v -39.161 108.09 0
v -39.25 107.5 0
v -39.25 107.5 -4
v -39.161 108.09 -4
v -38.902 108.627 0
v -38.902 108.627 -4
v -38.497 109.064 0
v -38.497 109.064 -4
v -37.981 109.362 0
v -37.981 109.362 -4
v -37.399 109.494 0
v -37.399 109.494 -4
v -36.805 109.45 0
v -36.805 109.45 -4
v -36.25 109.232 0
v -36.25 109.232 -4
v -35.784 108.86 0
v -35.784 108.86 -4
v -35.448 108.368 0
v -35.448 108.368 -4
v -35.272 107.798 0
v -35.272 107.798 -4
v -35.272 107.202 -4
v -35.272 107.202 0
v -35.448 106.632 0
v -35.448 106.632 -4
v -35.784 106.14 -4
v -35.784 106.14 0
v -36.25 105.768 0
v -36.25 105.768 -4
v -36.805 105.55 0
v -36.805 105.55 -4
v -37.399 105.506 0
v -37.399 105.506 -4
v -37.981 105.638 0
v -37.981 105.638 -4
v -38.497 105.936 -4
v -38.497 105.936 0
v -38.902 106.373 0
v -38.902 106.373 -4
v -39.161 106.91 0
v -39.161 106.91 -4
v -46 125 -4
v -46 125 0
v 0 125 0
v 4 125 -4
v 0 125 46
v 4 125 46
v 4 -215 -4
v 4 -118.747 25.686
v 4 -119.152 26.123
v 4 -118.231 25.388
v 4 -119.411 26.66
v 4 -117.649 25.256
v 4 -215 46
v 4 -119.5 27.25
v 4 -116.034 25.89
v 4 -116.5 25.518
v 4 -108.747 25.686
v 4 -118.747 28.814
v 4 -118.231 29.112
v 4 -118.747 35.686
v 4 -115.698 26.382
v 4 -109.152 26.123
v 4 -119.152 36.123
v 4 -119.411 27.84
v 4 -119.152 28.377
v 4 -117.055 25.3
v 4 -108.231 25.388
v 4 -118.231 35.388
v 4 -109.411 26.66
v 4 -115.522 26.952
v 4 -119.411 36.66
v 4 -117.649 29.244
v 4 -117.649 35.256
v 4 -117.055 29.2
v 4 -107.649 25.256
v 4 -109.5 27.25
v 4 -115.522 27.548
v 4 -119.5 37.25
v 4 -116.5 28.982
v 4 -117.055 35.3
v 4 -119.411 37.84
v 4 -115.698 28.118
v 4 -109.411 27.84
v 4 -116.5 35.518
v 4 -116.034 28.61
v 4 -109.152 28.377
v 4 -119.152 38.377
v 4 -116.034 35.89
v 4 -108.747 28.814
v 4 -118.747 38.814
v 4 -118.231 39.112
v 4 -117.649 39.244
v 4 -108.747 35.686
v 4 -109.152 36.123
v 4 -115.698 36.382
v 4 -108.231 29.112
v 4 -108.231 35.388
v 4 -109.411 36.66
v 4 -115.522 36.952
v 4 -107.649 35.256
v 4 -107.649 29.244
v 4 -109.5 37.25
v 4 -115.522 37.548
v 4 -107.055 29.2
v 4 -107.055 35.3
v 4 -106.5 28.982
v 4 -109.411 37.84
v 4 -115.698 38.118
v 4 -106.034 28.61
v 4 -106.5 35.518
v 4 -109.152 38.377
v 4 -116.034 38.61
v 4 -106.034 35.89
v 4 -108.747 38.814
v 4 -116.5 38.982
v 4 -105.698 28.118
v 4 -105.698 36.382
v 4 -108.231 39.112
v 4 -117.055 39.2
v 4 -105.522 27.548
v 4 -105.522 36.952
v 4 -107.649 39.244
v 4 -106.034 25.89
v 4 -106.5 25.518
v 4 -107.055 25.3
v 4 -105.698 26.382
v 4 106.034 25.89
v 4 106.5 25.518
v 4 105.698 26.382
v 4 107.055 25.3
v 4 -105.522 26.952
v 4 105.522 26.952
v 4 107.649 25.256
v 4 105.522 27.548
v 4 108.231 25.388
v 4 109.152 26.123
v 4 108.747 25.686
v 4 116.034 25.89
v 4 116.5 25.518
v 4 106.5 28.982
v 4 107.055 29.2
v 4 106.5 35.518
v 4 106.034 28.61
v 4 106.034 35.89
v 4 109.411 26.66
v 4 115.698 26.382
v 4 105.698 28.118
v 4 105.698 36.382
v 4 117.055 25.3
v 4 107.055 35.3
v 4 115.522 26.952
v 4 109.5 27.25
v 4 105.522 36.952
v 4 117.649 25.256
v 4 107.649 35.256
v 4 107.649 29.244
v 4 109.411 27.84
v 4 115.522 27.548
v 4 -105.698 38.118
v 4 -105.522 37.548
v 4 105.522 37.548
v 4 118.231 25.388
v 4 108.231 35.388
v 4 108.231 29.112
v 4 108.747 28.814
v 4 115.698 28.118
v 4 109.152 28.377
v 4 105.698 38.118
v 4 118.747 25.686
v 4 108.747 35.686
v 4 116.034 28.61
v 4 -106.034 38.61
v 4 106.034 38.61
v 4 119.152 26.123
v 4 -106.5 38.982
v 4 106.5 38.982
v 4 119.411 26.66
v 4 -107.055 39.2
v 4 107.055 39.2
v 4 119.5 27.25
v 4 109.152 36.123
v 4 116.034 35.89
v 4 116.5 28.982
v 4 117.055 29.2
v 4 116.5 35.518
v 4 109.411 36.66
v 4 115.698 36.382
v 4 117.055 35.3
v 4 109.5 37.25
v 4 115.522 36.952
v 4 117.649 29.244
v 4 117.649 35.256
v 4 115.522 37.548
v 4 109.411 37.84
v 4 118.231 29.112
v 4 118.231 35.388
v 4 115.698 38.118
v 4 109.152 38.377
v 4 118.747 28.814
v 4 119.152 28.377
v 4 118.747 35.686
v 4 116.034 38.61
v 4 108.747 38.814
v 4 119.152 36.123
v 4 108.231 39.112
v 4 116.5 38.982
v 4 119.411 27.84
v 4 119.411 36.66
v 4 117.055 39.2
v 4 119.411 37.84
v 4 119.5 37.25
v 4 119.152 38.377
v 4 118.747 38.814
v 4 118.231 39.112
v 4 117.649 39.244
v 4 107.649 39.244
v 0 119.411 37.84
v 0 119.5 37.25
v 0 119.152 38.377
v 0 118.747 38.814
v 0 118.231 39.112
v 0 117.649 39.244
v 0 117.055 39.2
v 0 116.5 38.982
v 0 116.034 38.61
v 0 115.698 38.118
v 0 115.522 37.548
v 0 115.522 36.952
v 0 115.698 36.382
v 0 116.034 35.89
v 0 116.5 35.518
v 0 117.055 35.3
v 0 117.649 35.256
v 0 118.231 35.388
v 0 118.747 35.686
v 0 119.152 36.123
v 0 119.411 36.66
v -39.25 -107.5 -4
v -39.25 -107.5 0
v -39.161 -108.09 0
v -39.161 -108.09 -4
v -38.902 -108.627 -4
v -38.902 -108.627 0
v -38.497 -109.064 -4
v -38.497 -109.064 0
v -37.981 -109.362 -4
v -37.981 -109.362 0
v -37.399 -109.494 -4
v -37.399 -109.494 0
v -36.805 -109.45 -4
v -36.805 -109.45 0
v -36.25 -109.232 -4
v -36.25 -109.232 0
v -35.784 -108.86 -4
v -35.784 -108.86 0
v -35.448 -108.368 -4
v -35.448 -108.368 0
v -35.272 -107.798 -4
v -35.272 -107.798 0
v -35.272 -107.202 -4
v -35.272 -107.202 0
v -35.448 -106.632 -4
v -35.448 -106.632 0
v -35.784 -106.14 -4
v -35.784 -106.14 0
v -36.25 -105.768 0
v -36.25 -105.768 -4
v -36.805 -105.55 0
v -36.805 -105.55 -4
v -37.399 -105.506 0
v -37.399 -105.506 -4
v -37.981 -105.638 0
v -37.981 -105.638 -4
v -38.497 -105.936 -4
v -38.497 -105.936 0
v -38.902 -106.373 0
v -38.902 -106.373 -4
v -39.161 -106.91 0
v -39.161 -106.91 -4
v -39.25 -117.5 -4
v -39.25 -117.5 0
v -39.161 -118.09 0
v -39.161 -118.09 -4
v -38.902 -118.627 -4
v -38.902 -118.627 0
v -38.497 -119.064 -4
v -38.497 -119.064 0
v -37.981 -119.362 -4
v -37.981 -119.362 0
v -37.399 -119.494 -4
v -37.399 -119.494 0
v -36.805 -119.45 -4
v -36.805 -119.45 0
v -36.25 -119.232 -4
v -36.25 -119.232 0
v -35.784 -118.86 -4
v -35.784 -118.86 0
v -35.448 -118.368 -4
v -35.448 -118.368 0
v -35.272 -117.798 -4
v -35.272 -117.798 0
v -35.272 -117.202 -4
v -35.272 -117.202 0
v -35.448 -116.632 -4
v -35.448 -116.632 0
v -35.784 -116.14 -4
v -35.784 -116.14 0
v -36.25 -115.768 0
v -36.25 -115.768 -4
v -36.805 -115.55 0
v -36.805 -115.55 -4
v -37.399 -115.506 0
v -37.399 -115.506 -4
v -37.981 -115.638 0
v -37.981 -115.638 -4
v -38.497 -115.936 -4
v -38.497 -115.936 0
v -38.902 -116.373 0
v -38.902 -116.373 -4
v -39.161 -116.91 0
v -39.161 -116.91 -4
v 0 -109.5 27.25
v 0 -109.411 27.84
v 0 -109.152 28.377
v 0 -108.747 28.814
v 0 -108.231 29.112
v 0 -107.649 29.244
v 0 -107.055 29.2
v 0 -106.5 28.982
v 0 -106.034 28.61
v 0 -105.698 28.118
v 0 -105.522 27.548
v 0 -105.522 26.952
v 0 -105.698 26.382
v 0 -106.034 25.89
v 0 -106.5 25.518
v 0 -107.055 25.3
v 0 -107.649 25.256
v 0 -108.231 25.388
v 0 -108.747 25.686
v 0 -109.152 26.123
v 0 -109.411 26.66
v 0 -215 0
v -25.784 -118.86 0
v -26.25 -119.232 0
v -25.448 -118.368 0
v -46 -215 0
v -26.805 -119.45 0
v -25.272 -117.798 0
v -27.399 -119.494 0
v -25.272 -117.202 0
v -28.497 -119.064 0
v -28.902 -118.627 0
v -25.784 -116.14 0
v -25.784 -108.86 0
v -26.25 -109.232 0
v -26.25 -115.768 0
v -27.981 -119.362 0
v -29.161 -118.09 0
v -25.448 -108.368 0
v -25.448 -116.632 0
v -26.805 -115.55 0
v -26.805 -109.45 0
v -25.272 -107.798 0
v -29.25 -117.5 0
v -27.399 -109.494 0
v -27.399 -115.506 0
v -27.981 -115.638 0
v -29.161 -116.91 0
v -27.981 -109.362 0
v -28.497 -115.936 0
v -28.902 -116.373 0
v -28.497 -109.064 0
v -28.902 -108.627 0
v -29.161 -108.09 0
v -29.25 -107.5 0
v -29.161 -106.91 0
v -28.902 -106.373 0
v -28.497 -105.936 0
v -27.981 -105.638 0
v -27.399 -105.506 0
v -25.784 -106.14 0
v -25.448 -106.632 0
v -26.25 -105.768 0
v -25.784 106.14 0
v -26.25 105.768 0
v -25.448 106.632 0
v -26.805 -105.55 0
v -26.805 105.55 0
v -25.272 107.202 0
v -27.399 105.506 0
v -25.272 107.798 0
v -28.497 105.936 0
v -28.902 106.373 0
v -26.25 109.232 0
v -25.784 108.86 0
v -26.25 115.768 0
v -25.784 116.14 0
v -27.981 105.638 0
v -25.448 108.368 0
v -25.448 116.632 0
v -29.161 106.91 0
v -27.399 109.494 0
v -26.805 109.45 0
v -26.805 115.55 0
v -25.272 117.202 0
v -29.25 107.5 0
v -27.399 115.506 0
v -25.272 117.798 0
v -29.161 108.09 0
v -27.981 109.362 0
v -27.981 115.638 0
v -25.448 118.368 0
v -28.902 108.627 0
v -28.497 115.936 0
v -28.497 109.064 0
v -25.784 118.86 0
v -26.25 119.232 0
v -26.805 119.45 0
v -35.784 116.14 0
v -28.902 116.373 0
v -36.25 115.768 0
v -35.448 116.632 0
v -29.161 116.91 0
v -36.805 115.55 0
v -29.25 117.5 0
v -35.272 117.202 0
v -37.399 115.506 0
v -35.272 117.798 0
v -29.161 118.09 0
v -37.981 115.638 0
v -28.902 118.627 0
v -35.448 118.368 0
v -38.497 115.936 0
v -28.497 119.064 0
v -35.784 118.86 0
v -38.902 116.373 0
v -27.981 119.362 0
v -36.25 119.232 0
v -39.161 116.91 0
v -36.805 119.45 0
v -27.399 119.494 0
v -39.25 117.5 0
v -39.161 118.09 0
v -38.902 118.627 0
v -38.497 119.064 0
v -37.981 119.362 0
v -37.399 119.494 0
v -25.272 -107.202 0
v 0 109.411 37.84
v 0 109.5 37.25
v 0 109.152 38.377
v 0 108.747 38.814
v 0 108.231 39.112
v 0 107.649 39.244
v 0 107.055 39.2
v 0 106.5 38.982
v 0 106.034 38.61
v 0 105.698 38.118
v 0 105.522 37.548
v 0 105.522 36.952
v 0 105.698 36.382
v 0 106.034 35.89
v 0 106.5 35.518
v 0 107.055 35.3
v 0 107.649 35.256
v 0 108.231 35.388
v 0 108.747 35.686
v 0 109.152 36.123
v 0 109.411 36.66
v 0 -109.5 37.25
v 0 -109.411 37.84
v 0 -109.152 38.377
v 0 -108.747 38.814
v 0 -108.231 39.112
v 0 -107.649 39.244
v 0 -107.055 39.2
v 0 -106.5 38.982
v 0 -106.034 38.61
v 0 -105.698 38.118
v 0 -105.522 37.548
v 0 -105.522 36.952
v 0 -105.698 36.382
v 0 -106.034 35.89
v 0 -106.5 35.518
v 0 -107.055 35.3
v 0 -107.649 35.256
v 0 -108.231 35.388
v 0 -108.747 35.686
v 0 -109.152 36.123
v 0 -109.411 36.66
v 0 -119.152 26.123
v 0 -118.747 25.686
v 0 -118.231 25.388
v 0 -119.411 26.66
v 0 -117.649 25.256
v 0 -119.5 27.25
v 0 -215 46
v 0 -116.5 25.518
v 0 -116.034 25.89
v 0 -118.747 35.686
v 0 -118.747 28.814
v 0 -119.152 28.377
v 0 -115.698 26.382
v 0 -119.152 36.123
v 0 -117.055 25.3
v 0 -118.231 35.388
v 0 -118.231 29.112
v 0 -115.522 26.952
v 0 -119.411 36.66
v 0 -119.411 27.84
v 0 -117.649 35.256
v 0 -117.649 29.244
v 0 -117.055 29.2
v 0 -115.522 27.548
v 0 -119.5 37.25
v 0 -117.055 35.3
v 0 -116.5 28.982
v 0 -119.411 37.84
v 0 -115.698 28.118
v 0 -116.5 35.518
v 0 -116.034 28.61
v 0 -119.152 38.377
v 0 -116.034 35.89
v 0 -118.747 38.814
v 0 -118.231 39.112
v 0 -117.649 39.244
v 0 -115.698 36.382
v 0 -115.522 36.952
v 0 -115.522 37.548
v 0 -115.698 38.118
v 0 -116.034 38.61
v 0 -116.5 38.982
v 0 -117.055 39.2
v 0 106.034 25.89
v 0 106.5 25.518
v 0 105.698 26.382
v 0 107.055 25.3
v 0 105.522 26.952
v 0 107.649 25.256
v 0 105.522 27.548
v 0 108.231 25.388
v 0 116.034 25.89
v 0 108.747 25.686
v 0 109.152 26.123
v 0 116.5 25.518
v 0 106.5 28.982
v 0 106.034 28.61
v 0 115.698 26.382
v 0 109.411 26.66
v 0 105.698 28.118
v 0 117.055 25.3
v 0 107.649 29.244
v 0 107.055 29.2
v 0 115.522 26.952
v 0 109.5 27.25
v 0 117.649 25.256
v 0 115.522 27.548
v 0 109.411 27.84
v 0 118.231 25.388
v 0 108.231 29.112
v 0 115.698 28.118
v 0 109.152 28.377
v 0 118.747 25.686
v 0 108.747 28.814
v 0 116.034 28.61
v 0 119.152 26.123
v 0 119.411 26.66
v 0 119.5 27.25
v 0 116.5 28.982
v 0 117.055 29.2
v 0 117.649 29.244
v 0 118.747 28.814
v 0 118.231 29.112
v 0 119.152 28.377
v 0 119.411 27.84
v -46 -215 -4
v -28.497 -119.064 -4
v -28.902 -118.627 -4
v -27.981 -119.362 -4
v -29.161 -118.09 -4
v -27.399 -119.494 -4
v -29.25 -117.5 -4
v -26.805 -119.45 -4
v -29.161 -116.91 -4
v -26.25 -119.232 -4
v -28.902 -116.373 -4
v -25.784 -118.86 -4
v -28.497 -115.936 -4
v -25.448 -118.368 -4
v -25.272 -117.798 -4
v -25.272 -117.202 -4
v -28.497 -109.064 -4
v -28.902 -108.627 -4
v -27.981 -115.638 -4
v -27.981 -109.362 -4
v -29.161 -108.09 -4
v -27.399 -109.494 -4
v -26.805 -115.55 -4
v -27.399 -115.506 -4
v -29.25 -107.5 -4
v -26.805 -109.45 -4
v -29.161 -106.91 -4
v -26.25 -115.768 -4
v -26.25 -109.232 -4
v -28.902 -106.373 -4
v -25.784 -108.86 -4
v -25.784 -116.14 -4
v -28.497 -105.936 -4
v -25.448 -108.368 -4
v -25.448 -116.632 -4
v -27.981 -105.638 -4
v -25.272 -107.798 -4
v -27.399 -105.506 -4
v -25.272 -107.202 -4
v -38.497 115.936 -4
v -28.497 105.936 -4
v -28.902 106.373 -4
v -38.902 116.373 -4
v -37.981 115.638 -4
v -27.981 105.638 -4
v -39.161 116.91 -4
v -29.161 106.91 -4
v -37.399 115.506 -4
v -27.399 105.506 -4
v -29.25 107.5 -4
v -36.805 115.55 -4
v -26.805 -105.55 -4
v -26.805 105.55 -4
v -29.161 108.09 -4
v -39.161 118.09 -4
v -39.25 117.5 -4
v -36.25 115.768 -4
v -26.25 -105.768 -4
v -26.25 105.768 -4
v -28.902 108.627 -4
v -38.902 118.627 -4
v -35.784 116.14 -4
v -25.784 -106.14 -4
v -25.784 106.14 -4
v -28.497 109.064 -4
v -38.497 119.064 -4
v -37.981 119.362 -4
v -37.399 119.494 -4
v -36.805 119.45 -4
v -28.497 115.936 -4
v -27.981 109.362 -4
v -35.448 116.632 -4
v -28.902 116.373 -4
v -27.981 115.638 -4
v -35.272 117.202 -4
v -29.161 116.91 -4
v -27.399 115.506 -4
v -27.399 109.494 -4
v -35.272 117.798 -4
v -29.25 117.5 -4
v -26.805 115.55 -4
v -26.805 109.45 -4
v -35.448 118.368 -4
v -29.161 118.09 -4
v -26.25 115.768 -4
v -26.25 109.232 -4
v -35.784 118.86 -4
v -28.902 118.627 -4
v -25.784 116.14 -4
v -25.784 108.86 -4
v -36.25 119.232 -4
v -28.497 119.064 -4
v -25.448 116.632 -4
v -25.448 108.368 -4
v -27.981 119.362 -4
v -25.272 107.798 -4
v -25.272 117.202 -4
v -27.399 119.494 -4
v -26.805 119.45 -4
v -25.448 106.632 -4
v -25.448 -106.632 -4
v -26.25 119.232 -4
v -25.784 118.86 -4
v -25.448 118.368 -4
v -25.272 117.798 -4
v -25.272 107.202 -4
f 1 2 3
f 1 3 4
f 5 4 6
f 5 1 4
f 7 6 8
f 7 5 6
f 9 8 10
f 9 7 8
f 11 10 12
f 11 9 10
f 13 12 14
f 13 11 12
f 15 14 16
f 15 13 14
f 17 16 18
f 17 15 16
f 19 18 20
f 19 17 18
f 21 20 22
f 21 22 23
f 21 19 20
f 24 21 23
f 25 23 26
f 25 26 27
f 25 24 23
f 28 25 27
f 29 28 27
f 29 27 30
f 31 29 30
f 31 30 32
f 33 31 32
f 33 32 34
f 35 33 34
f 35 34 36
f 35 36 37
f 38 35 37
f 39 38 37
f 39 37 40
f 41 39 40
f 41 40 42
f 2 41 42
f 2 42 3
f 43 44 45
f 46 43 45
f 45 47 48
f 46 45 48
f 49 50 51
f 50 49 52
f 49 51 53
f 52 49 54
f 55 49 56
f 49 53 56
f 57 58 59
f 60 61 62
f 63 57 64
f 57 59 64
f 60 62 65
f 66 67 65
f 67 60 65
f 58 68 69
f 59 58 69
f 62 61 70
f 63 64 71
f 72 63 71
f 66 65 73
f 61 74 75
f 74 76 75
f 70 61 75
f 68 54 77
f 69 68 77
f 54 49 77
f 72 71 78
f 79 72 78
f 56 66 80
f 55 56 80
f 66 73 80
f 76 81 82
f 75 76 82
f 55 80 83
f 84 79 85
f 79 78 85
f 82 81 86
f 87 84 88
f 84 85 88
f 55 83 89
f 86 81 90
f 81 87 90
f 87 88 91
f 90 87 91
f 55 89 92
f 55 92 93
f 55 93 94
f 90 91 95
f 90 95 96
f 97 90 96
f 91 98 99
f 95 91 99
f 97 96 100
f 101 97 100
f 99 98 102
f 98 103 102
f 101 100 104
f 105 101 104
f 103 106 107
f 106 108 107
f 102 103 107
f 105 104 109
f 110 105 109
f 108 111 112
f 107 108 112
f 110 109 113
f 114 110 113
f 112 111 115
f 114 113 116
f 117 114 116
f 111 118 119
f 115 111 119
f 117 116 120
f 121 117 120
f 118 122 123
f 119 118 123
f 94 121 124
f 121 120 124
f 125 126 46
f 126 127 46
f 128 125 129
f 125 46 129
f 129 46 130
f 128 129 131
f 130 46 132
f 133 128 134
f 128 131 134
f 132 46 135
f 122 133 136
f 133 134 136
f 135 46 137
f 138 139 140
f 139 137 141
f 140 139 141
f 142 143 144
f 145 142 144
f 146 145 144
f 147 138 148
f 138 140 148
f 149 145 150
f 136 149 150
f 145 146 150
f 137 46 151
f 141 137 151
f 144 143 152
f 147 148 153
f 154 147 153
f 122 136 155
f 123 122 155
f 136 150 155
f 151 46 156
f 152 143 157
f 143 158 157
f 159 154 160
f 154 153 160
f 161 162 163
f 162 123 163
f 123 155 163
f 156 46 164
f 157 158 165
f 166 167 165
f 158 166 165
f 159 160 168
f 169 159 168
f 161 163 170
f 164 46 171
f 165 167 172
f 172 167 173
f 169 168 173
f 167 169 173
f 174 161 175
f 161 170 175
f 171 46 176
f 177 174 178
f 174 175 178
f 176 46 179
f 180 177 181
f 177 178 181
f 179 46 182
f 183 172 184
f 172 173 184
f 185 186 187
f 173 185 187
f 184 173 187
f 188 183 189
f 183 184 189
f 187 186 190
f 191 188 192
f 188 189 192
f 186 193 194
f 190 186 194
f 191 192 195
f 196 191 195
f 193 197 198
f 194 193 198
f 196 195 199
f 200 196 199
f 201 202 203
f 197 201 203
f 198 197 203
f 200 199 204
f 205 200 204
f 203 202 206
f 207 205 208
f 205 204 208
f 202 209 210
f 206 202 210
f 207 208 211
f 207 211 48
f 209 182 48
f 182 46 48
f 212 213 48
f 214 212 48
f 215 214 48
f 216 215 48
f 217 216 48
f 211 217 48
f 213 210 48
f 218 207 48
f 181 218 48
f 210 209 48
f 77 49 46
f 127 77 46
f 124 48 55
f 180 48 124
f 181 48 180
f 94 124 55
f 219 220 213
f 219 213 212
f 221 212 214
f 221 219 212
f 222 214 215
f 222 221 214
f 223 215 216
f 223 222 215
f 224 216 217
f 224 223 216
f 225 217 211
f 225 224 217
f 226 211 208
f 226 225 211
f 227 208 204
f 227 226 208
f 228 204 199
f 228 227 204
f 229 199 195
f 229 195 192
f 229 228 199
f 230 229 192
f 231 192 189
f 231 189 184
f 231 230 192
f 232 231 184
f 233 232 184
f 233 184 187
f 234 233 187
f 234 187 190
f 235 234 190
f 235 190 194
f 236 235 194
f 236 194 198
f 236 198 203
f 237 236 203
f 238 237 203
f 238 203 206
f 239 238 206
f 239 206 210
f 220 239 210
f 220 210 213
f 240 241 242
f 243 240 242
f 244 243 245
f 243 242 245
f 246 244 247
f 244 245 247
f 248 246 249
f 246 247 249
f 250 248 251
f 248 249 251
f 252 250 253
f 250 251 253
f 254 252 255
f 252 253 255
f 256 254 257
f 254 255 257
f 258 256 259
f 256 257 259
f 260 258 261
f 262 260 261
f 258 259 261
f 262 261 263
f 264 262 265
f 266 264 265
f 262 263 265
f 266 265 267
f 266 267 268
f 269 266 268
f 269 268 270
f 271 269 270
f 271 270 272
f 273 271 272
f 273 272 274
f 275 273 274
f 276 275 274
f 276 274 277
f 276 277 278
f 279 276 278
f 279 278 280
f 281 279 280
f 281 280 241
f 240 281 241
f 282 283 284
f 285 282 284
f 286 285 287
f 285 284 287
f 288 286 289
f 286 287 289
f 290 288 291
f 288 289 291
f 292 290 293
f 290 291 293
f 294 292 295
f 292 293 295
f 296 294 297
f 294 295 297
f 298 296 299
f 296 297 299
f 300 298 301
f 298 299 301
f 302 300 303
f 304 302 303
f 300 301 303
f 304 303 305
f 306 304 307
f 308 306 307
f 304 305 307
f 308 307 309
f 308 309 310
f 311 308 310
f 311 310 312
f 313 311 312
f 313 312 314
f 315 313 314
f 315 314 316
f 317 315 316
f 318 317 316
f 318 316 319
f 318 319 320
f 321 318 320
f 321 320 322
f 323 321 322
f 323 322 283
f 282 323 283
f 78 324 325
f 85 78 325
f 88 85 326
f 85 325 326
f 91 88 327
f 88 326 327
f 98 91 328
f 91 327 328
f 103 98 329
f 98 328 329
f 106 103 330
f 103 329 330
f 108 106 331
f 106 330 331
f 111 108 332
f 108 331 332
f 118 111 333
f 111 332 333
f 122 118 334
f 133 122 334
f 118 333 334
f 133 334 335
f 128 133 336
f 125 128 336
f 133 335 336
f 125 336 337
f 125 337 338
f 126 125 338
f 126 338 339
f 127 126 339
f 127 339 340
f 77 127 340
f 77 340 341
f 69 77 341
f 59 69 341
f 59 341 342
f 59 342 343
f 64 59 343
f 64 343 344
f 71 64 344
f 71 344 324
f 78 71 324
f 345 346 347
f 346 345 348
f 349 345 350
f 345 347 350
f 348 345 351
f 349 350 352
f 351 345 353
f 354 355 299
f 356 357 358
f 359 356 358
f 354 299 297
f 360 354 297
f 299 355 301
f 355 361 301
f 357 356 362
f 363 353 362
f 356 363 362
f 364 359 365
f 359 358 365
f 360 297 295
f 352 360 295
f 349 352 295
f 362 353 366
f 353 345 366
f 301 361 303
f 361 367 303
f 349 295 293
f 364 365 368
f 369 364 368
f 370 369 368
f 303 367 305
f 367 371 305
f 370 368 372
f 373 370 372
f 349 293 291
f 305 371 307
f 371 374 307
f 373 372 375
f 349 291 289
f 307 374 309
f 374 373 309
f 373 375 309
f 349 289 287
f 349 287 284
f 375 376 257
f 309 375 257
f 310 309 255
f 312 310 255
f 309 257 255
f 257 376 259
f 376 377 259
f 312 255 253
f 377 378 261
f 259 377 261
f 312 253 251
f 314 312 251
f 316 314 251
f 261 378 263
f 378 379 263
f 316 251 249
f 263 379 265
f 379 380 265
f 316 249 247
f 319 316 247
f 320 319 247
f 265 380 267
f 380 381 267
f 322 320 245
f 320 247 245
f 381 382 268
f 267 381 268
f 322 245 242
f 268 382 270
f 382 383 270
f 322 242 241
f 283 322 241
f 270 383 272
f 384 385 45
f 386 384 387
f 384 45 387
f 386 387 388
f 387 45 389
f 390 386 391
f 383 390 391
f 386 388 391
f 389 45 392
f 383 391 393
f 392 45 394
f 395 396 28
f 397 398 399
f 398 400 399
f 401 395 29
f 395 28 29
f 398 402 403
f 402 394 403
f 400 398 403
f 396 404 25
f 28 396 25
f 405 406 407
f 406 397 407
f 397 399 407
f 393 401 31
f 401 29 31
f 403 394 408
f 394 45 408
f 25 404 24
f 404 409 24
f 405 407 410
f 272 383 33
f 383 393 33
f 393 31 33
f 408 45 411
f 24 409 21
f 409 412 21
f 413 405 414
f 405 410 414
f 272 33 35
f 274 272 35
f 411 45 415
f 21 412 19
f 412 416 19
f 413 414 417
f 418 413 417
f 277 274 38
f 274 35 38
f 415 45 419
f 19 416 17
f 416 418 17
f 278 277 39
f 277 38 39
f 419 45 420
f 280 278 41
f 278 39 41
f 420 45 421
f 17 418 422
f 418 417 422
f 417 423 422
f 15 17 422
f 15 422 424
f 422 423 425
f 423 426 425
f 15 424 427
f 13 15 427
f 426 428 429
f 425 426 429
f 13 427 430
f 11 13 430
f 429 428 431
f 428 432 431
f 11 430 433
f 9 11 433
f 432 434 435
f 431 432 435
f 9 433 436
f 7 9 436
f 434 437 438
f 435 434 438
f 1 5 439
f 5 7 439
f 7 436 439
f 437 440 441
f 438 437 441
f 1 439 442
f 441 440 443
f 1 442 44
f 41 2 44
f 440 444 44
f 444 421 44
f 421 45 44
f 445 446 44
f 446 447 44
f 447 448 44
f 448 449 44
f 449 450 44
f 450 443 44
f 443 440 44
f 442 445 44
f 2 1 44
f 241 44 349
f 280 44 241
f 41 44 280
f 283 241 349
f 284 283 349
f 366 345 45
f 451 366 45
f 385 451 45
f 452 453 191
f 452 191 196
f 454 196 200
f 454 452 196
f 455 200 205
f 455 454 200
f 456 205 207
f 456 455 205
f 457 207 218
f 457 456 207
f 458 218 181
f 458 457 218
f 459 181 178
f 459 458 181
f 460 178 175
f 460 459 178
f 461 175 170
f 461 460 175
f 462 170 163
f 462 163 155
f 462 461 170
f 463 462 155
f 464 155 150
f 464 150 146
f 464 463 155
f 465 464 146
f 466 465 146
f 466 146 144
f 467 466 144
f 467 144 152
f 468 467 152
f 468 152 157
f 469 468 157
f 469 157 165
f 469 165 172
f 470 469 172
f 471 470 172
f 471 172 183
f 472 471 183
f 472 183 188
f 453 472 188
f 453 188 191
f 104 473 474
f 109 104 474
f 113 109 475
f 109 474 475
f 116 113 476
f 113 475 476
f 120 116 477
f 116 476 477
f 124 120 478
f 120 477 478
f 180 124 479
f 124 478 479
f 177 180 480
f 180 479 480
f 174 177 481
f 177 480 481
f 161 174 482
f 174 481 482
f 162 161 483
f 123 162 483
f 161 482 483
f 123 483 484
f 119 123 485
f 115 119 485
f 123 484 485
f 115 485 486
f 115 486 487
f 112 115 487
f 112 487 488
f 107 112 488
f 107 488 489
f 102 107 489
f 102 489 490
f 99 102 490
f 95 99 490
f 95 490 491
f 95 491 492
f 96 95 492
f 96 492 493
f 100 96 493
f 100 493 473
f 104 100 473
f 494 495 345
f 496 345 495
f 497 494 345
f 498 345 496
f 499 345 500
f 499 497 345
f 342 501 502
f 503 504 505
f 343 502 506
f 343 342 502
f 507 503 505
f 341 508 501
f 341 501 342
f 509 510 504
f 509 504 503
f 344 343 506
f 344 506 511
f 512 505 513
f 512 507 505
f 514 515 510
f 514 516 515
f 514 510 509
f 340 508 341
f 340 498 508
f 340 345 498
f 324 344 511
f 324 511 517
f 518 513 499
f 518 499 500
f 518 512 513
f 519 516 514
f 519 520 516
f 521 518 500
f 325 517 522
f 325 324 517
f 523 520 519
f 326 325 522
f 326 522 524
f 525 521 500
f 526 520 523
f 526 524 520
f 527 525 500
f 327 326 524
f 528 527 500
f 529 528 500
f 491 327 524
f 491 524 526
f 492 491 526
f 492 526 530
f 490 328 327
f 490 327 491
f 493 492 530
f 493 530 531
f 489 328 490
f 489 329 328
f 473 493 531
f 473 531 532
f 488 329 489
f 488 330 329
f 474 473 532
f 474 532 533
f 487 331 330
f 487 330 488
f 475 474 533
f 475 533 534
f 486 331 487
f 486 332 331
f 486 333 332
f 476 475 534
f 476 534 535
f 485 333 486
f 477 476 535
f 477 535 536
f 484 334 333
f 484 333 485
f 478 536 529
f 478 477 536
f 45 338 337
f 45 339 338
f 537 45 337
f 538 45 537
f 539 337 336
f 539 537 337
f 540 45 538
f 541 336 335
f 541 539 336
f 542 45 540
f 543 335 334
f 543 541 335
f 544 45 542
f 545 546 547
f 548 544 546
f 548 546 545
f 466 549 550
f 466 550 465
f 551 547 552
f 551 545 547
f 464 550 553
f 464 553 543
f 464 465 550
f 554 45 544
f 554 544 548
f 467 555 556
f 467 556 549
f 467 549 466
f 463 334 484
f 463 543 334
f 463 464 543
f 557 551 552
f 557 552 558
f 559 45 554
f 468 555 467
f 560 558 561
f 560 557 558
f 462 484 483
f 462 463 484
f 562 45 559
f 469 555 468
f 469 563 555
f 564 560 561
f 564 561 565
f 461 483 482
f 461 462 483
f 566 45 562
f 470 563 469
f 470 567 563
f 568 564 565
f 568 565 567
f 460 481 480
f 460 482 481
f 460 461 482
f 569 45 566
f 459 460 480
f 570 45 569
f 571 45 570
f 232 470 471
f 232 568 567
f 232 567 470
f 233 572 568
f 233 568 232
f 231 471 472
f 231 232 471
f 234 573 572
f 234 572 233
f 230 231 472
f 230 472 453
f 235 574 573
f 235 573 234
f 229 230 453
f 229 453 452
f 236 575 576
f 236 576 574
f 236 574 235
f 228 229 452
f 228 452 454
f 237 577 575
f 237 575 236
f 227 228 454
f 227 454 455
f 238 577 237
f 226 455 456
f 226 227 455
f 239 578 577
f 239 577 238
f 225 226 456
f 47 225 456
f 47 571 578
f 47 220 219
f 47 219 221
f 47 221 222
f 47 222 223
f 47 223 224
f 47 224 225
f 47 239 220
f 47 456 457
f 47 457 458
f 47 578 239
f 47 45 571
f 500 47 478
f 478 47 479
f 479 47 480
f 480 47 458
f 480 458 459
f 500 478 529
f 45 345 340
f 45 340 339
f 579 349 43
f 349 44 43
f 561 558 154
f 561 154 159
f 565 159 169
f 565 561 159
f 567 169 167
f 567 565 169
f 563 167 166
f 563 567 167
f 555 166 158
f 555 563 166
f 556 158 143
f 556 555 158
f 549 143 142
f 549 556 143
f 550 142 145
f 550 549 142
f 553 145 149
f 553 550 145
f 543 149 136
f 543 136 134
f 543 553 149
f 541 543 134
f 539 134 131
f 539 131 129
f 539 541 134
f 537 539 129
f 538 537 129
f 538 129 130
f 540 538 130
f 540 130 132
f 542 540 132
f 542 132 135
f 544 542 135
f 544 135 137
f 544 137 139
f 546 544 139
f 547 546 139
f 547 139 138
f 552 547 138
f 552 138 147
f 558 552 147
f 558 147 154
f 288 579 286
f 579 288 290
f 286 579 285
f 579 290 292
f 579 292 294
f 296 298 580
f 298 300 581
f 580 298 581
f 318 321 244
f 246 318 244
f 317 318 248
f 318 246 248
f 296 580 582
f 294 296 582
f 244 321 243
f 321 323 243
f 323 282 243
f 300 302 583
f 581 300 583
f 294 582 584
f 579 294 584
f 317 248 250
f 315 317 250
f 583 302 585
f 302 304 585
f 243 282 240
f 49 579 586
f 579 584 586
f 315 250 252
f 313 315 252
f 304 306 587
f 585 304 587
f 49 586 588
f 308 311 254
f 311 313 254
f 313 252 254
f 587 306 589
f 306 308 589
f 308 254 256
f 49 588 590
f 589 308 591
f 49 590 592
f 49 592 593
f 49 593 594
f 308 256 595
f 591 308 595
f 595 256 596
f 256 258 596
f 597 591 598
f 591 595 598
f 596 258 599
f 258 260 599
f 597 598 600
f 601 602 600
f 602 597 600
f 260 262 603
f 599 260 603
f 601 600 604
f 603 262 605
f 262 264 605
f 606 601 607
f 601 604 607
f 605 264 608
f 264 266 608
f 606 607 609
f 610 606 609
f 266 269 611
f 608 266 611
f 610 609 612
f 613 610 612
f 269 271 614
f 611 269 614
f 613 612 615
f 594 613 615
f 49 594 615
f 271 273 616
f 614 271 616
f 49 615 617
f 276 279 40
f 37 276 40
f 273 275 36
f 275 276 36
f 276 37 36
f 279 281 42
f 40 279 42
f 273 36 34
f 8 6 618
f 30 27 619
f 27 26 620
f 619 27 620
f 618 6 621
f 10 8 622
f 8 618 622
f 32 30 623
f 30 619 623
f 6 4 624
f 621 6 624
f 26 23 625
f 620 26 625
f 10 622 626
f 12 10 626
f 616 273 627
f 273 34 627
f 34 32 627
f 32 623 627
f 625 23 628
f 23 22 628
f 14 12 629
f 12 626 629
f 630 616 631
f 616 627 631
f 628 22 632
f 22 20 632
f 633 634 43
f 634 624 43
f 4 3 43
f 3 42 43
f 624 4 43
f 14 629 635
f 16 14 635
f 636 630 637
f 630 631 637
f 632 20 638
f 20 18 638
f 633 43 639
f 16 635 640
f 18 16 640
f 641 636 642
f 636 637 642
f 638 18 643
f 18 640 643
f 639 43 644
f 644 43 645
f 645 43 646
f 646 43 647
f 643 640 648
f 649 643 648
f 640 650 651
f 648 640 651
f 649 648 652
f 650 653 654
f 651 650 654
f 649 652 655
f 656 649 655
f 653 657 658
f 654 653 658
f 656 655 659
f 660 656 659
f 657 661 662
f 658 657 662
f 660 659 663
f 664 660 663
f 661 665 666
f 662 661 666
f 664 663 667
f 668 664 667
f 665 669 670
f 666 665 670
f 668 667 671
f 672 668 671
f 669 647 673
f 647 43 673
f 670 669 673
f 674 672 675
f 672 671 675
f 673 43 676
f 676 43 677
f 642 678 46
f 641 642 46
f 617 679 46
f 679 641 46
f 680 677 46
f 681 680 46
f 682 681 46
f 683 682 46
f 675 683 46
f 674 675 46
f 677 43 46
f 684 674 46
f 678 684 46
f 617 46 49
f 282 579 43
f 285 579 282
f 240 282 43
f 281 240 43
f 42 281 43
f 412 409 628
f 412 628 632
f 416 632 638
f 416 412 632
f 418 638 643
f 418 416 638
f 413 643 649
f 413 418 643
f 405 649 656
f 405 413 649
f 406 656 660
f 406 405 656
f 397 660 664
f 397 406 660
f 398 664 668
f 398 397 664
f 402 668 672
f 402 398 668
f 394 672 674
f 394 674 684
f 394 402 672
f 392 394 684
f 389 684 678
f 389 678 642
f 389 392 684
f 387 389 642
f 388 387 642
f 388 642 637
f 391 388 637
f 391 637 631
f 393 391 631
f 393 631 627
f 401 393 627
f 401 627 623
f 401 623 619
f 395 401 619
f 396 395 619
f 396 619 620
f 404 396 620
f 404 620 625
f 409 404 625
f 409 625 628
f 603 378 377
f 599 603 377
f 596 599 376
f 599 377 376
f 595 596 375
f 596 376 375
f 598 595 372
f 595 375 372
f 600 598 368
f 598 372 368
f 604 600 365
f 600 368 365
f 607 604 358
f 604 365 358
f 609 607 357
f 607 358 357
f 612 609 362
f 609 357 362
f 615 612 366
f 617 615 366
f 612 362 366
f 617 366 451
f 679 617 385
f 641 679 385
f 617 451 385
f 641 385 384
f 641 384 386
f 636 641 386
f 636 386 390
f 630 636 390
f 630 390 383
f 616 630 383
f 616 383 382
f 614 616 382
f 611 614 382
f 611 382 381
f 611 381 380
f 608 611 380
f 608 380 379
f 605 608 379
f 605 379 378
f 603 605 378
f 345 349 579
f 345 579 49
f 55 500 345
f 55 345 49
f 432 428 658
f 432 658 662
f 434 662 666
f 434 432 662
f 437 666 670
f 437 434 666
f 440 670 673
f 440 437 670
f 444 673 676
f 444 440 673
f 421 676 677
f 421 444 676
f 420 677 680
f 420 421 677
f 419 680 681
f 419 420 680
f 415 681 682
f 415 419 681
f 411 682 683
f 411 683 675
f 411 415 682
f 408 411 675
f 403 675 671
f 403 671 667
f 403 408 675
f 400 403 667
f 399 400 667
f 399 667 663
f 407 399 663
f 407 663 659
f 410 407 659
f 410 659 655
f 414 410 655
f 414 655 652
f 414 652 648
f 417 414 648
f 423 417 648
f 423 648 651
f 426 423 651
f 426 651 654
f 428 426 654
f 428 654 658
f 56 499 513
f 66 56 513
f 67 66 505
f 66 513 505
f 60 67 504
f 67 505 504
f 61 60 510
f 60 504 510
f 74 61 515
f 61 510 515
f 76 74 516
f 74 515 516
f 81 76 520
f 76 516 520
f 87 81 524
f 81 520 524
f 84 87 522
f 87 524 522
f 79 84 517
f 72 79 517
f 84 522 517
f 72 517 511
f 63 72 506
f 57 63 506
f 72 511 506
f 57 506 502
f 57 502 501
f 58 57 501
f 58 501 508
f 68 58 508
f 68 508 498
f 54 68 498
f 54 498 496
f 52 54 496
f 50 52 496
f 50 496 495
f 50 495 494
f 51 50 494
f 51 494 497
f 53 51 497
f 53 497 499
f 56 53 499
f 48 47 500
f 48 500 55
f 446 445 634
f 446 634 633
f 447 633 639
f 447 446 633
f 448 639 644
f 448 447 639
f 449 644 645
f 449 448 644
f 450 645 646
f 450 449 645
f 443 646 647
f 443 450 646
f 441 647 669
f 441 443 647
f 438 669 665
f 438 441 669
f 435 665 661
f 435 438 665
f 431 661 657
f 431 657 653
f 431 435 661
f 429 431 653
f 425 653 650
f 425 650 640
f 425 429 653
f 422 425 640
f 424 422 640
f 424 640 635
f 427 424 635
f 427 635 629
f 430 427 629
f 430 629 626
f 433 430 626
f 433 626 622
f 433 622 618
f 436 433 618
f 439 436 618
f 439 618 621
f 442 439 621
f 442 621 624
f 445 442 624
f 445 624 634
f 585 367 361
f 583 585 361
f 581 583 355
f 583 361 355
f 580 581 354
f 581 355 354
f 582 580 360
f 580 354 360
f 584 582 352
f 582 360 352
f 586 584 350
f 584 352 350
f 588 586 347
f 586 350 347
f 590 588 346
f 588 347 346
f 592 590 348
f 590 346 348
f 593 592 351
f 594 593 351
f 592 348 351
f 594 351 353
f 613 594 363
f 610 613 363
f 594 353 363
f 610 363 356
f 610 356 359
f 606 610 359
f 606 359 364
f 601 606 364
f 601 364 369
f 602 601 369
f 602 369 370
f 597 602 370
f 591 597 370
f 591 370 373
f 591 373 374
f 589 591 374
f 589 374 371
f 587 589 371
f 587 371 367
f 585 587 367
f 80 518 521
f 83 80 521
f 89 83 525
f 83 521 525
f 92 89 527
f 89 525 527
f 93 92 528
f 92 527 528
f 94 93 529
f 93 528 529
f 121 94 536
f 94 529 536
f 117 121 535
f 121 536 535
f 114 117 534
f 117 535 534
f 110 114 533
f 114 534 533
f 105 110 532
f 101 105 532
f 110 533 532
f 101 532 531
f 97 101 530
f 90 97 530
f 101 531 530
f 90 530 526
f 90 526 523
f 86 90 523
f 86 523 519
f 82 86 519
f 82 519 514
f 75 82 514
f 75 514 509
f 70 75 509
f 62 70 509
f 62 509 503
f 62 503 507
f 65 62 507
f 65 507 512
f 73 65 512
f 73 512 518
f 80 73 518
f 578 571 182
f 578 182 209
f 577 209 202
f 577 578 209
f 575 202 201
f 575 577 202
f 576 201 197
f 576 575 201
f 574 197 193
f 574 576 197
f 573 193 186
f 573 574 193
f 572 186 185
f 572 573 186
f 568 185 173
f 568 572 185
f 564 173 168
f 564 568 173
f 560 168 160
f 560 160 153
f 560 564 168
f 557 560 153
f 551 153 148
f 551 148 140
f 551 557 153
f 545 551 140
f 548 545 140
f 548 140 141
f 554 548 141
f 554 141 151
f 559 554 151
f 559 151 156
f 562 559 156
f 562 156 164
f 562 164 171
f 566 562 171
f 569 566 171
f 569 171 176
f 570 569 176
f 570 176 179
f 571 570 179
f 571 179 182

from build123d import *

# Parameters (mm, degrees)
F0_W           = 4
F0_H           = 46
F1_DEPTH       = 125
F4_D           = 4
F4_DEPTH       = 15
F4_TIP         = 1.2017212381
F4_ON_F2_D     = 4
F4_ON_F2_DEPTH = 15
F4_ON_F2_TIP   = 1.2017212381
F6_DEPTH       = 90


with BuildPart() as f1:
    # F0 (on Front) → F1 (new body)
    with BuildSketch(Plane.XZ):
        with Locations((2, 23)):
            Rectangle(F0_W, F0_H)
        Polygon((4, 0), (0, 0), (-46, 0), (-46, -4), (4, -4), align=None)
    extrude(amount=F1_DEPTH)

    # F4
    with Locations(Plane.YZ.offset(4)):
        with Locations((-117.5, 37.25), (-107.5, 37.25), (-107.5, 27.25), (-117.5, 27.25)):
            Hole(F4_D / 2, depth=F4_DEPTH)
            with Locations((0, 0, -(F4_DEPTH + F4_TIP / 2))):  # 118° drill point
                Cone(0, F4_D / 2, F4_TIP, mode=Mode.SUBTRACT)

    # F4 on F2
    with Locations(Plane(origin=(0, 0, -4), x_dir=(1, 0, 0), z_dir=(0, 0, -1))):
        with Locations((-27.25, 117.5), (-37.25, 117.5), (-37.25, 107.5), (-27.25, 107.5)):
            Hole(F4_ON_F2_D / 2, depth=F4_ON_F2_DEPTH)
            with Locations((0, 0, -(F4_ON_F2_DEPTH + F4_ON_F2_TIP / 2))):  # 118° drill point
                Cone(0, F4_ON_F2_D / 2, F4_ON_F2_TIP, mode=Mode.SUBTRACT)

    # F5: F1 across face


with BuildPart() as f1_1:
    add(f1.part)
    add(f1.part.mirror(Plane(origin=(-9.9791666667, 0, 9.9791666667), x_dir=(1, 0, 0), z_dir=(0, 1, 0))))

    # F6 (add): a face of the model
    f6_faces = [f1_1.faces().sort_by_distance(p)[0] for p in [
        (0.7071067812, -125, 23),
    ]]
    extrude(f6_faces, amount=F6_DEPTH)


solid = f1_1.part
